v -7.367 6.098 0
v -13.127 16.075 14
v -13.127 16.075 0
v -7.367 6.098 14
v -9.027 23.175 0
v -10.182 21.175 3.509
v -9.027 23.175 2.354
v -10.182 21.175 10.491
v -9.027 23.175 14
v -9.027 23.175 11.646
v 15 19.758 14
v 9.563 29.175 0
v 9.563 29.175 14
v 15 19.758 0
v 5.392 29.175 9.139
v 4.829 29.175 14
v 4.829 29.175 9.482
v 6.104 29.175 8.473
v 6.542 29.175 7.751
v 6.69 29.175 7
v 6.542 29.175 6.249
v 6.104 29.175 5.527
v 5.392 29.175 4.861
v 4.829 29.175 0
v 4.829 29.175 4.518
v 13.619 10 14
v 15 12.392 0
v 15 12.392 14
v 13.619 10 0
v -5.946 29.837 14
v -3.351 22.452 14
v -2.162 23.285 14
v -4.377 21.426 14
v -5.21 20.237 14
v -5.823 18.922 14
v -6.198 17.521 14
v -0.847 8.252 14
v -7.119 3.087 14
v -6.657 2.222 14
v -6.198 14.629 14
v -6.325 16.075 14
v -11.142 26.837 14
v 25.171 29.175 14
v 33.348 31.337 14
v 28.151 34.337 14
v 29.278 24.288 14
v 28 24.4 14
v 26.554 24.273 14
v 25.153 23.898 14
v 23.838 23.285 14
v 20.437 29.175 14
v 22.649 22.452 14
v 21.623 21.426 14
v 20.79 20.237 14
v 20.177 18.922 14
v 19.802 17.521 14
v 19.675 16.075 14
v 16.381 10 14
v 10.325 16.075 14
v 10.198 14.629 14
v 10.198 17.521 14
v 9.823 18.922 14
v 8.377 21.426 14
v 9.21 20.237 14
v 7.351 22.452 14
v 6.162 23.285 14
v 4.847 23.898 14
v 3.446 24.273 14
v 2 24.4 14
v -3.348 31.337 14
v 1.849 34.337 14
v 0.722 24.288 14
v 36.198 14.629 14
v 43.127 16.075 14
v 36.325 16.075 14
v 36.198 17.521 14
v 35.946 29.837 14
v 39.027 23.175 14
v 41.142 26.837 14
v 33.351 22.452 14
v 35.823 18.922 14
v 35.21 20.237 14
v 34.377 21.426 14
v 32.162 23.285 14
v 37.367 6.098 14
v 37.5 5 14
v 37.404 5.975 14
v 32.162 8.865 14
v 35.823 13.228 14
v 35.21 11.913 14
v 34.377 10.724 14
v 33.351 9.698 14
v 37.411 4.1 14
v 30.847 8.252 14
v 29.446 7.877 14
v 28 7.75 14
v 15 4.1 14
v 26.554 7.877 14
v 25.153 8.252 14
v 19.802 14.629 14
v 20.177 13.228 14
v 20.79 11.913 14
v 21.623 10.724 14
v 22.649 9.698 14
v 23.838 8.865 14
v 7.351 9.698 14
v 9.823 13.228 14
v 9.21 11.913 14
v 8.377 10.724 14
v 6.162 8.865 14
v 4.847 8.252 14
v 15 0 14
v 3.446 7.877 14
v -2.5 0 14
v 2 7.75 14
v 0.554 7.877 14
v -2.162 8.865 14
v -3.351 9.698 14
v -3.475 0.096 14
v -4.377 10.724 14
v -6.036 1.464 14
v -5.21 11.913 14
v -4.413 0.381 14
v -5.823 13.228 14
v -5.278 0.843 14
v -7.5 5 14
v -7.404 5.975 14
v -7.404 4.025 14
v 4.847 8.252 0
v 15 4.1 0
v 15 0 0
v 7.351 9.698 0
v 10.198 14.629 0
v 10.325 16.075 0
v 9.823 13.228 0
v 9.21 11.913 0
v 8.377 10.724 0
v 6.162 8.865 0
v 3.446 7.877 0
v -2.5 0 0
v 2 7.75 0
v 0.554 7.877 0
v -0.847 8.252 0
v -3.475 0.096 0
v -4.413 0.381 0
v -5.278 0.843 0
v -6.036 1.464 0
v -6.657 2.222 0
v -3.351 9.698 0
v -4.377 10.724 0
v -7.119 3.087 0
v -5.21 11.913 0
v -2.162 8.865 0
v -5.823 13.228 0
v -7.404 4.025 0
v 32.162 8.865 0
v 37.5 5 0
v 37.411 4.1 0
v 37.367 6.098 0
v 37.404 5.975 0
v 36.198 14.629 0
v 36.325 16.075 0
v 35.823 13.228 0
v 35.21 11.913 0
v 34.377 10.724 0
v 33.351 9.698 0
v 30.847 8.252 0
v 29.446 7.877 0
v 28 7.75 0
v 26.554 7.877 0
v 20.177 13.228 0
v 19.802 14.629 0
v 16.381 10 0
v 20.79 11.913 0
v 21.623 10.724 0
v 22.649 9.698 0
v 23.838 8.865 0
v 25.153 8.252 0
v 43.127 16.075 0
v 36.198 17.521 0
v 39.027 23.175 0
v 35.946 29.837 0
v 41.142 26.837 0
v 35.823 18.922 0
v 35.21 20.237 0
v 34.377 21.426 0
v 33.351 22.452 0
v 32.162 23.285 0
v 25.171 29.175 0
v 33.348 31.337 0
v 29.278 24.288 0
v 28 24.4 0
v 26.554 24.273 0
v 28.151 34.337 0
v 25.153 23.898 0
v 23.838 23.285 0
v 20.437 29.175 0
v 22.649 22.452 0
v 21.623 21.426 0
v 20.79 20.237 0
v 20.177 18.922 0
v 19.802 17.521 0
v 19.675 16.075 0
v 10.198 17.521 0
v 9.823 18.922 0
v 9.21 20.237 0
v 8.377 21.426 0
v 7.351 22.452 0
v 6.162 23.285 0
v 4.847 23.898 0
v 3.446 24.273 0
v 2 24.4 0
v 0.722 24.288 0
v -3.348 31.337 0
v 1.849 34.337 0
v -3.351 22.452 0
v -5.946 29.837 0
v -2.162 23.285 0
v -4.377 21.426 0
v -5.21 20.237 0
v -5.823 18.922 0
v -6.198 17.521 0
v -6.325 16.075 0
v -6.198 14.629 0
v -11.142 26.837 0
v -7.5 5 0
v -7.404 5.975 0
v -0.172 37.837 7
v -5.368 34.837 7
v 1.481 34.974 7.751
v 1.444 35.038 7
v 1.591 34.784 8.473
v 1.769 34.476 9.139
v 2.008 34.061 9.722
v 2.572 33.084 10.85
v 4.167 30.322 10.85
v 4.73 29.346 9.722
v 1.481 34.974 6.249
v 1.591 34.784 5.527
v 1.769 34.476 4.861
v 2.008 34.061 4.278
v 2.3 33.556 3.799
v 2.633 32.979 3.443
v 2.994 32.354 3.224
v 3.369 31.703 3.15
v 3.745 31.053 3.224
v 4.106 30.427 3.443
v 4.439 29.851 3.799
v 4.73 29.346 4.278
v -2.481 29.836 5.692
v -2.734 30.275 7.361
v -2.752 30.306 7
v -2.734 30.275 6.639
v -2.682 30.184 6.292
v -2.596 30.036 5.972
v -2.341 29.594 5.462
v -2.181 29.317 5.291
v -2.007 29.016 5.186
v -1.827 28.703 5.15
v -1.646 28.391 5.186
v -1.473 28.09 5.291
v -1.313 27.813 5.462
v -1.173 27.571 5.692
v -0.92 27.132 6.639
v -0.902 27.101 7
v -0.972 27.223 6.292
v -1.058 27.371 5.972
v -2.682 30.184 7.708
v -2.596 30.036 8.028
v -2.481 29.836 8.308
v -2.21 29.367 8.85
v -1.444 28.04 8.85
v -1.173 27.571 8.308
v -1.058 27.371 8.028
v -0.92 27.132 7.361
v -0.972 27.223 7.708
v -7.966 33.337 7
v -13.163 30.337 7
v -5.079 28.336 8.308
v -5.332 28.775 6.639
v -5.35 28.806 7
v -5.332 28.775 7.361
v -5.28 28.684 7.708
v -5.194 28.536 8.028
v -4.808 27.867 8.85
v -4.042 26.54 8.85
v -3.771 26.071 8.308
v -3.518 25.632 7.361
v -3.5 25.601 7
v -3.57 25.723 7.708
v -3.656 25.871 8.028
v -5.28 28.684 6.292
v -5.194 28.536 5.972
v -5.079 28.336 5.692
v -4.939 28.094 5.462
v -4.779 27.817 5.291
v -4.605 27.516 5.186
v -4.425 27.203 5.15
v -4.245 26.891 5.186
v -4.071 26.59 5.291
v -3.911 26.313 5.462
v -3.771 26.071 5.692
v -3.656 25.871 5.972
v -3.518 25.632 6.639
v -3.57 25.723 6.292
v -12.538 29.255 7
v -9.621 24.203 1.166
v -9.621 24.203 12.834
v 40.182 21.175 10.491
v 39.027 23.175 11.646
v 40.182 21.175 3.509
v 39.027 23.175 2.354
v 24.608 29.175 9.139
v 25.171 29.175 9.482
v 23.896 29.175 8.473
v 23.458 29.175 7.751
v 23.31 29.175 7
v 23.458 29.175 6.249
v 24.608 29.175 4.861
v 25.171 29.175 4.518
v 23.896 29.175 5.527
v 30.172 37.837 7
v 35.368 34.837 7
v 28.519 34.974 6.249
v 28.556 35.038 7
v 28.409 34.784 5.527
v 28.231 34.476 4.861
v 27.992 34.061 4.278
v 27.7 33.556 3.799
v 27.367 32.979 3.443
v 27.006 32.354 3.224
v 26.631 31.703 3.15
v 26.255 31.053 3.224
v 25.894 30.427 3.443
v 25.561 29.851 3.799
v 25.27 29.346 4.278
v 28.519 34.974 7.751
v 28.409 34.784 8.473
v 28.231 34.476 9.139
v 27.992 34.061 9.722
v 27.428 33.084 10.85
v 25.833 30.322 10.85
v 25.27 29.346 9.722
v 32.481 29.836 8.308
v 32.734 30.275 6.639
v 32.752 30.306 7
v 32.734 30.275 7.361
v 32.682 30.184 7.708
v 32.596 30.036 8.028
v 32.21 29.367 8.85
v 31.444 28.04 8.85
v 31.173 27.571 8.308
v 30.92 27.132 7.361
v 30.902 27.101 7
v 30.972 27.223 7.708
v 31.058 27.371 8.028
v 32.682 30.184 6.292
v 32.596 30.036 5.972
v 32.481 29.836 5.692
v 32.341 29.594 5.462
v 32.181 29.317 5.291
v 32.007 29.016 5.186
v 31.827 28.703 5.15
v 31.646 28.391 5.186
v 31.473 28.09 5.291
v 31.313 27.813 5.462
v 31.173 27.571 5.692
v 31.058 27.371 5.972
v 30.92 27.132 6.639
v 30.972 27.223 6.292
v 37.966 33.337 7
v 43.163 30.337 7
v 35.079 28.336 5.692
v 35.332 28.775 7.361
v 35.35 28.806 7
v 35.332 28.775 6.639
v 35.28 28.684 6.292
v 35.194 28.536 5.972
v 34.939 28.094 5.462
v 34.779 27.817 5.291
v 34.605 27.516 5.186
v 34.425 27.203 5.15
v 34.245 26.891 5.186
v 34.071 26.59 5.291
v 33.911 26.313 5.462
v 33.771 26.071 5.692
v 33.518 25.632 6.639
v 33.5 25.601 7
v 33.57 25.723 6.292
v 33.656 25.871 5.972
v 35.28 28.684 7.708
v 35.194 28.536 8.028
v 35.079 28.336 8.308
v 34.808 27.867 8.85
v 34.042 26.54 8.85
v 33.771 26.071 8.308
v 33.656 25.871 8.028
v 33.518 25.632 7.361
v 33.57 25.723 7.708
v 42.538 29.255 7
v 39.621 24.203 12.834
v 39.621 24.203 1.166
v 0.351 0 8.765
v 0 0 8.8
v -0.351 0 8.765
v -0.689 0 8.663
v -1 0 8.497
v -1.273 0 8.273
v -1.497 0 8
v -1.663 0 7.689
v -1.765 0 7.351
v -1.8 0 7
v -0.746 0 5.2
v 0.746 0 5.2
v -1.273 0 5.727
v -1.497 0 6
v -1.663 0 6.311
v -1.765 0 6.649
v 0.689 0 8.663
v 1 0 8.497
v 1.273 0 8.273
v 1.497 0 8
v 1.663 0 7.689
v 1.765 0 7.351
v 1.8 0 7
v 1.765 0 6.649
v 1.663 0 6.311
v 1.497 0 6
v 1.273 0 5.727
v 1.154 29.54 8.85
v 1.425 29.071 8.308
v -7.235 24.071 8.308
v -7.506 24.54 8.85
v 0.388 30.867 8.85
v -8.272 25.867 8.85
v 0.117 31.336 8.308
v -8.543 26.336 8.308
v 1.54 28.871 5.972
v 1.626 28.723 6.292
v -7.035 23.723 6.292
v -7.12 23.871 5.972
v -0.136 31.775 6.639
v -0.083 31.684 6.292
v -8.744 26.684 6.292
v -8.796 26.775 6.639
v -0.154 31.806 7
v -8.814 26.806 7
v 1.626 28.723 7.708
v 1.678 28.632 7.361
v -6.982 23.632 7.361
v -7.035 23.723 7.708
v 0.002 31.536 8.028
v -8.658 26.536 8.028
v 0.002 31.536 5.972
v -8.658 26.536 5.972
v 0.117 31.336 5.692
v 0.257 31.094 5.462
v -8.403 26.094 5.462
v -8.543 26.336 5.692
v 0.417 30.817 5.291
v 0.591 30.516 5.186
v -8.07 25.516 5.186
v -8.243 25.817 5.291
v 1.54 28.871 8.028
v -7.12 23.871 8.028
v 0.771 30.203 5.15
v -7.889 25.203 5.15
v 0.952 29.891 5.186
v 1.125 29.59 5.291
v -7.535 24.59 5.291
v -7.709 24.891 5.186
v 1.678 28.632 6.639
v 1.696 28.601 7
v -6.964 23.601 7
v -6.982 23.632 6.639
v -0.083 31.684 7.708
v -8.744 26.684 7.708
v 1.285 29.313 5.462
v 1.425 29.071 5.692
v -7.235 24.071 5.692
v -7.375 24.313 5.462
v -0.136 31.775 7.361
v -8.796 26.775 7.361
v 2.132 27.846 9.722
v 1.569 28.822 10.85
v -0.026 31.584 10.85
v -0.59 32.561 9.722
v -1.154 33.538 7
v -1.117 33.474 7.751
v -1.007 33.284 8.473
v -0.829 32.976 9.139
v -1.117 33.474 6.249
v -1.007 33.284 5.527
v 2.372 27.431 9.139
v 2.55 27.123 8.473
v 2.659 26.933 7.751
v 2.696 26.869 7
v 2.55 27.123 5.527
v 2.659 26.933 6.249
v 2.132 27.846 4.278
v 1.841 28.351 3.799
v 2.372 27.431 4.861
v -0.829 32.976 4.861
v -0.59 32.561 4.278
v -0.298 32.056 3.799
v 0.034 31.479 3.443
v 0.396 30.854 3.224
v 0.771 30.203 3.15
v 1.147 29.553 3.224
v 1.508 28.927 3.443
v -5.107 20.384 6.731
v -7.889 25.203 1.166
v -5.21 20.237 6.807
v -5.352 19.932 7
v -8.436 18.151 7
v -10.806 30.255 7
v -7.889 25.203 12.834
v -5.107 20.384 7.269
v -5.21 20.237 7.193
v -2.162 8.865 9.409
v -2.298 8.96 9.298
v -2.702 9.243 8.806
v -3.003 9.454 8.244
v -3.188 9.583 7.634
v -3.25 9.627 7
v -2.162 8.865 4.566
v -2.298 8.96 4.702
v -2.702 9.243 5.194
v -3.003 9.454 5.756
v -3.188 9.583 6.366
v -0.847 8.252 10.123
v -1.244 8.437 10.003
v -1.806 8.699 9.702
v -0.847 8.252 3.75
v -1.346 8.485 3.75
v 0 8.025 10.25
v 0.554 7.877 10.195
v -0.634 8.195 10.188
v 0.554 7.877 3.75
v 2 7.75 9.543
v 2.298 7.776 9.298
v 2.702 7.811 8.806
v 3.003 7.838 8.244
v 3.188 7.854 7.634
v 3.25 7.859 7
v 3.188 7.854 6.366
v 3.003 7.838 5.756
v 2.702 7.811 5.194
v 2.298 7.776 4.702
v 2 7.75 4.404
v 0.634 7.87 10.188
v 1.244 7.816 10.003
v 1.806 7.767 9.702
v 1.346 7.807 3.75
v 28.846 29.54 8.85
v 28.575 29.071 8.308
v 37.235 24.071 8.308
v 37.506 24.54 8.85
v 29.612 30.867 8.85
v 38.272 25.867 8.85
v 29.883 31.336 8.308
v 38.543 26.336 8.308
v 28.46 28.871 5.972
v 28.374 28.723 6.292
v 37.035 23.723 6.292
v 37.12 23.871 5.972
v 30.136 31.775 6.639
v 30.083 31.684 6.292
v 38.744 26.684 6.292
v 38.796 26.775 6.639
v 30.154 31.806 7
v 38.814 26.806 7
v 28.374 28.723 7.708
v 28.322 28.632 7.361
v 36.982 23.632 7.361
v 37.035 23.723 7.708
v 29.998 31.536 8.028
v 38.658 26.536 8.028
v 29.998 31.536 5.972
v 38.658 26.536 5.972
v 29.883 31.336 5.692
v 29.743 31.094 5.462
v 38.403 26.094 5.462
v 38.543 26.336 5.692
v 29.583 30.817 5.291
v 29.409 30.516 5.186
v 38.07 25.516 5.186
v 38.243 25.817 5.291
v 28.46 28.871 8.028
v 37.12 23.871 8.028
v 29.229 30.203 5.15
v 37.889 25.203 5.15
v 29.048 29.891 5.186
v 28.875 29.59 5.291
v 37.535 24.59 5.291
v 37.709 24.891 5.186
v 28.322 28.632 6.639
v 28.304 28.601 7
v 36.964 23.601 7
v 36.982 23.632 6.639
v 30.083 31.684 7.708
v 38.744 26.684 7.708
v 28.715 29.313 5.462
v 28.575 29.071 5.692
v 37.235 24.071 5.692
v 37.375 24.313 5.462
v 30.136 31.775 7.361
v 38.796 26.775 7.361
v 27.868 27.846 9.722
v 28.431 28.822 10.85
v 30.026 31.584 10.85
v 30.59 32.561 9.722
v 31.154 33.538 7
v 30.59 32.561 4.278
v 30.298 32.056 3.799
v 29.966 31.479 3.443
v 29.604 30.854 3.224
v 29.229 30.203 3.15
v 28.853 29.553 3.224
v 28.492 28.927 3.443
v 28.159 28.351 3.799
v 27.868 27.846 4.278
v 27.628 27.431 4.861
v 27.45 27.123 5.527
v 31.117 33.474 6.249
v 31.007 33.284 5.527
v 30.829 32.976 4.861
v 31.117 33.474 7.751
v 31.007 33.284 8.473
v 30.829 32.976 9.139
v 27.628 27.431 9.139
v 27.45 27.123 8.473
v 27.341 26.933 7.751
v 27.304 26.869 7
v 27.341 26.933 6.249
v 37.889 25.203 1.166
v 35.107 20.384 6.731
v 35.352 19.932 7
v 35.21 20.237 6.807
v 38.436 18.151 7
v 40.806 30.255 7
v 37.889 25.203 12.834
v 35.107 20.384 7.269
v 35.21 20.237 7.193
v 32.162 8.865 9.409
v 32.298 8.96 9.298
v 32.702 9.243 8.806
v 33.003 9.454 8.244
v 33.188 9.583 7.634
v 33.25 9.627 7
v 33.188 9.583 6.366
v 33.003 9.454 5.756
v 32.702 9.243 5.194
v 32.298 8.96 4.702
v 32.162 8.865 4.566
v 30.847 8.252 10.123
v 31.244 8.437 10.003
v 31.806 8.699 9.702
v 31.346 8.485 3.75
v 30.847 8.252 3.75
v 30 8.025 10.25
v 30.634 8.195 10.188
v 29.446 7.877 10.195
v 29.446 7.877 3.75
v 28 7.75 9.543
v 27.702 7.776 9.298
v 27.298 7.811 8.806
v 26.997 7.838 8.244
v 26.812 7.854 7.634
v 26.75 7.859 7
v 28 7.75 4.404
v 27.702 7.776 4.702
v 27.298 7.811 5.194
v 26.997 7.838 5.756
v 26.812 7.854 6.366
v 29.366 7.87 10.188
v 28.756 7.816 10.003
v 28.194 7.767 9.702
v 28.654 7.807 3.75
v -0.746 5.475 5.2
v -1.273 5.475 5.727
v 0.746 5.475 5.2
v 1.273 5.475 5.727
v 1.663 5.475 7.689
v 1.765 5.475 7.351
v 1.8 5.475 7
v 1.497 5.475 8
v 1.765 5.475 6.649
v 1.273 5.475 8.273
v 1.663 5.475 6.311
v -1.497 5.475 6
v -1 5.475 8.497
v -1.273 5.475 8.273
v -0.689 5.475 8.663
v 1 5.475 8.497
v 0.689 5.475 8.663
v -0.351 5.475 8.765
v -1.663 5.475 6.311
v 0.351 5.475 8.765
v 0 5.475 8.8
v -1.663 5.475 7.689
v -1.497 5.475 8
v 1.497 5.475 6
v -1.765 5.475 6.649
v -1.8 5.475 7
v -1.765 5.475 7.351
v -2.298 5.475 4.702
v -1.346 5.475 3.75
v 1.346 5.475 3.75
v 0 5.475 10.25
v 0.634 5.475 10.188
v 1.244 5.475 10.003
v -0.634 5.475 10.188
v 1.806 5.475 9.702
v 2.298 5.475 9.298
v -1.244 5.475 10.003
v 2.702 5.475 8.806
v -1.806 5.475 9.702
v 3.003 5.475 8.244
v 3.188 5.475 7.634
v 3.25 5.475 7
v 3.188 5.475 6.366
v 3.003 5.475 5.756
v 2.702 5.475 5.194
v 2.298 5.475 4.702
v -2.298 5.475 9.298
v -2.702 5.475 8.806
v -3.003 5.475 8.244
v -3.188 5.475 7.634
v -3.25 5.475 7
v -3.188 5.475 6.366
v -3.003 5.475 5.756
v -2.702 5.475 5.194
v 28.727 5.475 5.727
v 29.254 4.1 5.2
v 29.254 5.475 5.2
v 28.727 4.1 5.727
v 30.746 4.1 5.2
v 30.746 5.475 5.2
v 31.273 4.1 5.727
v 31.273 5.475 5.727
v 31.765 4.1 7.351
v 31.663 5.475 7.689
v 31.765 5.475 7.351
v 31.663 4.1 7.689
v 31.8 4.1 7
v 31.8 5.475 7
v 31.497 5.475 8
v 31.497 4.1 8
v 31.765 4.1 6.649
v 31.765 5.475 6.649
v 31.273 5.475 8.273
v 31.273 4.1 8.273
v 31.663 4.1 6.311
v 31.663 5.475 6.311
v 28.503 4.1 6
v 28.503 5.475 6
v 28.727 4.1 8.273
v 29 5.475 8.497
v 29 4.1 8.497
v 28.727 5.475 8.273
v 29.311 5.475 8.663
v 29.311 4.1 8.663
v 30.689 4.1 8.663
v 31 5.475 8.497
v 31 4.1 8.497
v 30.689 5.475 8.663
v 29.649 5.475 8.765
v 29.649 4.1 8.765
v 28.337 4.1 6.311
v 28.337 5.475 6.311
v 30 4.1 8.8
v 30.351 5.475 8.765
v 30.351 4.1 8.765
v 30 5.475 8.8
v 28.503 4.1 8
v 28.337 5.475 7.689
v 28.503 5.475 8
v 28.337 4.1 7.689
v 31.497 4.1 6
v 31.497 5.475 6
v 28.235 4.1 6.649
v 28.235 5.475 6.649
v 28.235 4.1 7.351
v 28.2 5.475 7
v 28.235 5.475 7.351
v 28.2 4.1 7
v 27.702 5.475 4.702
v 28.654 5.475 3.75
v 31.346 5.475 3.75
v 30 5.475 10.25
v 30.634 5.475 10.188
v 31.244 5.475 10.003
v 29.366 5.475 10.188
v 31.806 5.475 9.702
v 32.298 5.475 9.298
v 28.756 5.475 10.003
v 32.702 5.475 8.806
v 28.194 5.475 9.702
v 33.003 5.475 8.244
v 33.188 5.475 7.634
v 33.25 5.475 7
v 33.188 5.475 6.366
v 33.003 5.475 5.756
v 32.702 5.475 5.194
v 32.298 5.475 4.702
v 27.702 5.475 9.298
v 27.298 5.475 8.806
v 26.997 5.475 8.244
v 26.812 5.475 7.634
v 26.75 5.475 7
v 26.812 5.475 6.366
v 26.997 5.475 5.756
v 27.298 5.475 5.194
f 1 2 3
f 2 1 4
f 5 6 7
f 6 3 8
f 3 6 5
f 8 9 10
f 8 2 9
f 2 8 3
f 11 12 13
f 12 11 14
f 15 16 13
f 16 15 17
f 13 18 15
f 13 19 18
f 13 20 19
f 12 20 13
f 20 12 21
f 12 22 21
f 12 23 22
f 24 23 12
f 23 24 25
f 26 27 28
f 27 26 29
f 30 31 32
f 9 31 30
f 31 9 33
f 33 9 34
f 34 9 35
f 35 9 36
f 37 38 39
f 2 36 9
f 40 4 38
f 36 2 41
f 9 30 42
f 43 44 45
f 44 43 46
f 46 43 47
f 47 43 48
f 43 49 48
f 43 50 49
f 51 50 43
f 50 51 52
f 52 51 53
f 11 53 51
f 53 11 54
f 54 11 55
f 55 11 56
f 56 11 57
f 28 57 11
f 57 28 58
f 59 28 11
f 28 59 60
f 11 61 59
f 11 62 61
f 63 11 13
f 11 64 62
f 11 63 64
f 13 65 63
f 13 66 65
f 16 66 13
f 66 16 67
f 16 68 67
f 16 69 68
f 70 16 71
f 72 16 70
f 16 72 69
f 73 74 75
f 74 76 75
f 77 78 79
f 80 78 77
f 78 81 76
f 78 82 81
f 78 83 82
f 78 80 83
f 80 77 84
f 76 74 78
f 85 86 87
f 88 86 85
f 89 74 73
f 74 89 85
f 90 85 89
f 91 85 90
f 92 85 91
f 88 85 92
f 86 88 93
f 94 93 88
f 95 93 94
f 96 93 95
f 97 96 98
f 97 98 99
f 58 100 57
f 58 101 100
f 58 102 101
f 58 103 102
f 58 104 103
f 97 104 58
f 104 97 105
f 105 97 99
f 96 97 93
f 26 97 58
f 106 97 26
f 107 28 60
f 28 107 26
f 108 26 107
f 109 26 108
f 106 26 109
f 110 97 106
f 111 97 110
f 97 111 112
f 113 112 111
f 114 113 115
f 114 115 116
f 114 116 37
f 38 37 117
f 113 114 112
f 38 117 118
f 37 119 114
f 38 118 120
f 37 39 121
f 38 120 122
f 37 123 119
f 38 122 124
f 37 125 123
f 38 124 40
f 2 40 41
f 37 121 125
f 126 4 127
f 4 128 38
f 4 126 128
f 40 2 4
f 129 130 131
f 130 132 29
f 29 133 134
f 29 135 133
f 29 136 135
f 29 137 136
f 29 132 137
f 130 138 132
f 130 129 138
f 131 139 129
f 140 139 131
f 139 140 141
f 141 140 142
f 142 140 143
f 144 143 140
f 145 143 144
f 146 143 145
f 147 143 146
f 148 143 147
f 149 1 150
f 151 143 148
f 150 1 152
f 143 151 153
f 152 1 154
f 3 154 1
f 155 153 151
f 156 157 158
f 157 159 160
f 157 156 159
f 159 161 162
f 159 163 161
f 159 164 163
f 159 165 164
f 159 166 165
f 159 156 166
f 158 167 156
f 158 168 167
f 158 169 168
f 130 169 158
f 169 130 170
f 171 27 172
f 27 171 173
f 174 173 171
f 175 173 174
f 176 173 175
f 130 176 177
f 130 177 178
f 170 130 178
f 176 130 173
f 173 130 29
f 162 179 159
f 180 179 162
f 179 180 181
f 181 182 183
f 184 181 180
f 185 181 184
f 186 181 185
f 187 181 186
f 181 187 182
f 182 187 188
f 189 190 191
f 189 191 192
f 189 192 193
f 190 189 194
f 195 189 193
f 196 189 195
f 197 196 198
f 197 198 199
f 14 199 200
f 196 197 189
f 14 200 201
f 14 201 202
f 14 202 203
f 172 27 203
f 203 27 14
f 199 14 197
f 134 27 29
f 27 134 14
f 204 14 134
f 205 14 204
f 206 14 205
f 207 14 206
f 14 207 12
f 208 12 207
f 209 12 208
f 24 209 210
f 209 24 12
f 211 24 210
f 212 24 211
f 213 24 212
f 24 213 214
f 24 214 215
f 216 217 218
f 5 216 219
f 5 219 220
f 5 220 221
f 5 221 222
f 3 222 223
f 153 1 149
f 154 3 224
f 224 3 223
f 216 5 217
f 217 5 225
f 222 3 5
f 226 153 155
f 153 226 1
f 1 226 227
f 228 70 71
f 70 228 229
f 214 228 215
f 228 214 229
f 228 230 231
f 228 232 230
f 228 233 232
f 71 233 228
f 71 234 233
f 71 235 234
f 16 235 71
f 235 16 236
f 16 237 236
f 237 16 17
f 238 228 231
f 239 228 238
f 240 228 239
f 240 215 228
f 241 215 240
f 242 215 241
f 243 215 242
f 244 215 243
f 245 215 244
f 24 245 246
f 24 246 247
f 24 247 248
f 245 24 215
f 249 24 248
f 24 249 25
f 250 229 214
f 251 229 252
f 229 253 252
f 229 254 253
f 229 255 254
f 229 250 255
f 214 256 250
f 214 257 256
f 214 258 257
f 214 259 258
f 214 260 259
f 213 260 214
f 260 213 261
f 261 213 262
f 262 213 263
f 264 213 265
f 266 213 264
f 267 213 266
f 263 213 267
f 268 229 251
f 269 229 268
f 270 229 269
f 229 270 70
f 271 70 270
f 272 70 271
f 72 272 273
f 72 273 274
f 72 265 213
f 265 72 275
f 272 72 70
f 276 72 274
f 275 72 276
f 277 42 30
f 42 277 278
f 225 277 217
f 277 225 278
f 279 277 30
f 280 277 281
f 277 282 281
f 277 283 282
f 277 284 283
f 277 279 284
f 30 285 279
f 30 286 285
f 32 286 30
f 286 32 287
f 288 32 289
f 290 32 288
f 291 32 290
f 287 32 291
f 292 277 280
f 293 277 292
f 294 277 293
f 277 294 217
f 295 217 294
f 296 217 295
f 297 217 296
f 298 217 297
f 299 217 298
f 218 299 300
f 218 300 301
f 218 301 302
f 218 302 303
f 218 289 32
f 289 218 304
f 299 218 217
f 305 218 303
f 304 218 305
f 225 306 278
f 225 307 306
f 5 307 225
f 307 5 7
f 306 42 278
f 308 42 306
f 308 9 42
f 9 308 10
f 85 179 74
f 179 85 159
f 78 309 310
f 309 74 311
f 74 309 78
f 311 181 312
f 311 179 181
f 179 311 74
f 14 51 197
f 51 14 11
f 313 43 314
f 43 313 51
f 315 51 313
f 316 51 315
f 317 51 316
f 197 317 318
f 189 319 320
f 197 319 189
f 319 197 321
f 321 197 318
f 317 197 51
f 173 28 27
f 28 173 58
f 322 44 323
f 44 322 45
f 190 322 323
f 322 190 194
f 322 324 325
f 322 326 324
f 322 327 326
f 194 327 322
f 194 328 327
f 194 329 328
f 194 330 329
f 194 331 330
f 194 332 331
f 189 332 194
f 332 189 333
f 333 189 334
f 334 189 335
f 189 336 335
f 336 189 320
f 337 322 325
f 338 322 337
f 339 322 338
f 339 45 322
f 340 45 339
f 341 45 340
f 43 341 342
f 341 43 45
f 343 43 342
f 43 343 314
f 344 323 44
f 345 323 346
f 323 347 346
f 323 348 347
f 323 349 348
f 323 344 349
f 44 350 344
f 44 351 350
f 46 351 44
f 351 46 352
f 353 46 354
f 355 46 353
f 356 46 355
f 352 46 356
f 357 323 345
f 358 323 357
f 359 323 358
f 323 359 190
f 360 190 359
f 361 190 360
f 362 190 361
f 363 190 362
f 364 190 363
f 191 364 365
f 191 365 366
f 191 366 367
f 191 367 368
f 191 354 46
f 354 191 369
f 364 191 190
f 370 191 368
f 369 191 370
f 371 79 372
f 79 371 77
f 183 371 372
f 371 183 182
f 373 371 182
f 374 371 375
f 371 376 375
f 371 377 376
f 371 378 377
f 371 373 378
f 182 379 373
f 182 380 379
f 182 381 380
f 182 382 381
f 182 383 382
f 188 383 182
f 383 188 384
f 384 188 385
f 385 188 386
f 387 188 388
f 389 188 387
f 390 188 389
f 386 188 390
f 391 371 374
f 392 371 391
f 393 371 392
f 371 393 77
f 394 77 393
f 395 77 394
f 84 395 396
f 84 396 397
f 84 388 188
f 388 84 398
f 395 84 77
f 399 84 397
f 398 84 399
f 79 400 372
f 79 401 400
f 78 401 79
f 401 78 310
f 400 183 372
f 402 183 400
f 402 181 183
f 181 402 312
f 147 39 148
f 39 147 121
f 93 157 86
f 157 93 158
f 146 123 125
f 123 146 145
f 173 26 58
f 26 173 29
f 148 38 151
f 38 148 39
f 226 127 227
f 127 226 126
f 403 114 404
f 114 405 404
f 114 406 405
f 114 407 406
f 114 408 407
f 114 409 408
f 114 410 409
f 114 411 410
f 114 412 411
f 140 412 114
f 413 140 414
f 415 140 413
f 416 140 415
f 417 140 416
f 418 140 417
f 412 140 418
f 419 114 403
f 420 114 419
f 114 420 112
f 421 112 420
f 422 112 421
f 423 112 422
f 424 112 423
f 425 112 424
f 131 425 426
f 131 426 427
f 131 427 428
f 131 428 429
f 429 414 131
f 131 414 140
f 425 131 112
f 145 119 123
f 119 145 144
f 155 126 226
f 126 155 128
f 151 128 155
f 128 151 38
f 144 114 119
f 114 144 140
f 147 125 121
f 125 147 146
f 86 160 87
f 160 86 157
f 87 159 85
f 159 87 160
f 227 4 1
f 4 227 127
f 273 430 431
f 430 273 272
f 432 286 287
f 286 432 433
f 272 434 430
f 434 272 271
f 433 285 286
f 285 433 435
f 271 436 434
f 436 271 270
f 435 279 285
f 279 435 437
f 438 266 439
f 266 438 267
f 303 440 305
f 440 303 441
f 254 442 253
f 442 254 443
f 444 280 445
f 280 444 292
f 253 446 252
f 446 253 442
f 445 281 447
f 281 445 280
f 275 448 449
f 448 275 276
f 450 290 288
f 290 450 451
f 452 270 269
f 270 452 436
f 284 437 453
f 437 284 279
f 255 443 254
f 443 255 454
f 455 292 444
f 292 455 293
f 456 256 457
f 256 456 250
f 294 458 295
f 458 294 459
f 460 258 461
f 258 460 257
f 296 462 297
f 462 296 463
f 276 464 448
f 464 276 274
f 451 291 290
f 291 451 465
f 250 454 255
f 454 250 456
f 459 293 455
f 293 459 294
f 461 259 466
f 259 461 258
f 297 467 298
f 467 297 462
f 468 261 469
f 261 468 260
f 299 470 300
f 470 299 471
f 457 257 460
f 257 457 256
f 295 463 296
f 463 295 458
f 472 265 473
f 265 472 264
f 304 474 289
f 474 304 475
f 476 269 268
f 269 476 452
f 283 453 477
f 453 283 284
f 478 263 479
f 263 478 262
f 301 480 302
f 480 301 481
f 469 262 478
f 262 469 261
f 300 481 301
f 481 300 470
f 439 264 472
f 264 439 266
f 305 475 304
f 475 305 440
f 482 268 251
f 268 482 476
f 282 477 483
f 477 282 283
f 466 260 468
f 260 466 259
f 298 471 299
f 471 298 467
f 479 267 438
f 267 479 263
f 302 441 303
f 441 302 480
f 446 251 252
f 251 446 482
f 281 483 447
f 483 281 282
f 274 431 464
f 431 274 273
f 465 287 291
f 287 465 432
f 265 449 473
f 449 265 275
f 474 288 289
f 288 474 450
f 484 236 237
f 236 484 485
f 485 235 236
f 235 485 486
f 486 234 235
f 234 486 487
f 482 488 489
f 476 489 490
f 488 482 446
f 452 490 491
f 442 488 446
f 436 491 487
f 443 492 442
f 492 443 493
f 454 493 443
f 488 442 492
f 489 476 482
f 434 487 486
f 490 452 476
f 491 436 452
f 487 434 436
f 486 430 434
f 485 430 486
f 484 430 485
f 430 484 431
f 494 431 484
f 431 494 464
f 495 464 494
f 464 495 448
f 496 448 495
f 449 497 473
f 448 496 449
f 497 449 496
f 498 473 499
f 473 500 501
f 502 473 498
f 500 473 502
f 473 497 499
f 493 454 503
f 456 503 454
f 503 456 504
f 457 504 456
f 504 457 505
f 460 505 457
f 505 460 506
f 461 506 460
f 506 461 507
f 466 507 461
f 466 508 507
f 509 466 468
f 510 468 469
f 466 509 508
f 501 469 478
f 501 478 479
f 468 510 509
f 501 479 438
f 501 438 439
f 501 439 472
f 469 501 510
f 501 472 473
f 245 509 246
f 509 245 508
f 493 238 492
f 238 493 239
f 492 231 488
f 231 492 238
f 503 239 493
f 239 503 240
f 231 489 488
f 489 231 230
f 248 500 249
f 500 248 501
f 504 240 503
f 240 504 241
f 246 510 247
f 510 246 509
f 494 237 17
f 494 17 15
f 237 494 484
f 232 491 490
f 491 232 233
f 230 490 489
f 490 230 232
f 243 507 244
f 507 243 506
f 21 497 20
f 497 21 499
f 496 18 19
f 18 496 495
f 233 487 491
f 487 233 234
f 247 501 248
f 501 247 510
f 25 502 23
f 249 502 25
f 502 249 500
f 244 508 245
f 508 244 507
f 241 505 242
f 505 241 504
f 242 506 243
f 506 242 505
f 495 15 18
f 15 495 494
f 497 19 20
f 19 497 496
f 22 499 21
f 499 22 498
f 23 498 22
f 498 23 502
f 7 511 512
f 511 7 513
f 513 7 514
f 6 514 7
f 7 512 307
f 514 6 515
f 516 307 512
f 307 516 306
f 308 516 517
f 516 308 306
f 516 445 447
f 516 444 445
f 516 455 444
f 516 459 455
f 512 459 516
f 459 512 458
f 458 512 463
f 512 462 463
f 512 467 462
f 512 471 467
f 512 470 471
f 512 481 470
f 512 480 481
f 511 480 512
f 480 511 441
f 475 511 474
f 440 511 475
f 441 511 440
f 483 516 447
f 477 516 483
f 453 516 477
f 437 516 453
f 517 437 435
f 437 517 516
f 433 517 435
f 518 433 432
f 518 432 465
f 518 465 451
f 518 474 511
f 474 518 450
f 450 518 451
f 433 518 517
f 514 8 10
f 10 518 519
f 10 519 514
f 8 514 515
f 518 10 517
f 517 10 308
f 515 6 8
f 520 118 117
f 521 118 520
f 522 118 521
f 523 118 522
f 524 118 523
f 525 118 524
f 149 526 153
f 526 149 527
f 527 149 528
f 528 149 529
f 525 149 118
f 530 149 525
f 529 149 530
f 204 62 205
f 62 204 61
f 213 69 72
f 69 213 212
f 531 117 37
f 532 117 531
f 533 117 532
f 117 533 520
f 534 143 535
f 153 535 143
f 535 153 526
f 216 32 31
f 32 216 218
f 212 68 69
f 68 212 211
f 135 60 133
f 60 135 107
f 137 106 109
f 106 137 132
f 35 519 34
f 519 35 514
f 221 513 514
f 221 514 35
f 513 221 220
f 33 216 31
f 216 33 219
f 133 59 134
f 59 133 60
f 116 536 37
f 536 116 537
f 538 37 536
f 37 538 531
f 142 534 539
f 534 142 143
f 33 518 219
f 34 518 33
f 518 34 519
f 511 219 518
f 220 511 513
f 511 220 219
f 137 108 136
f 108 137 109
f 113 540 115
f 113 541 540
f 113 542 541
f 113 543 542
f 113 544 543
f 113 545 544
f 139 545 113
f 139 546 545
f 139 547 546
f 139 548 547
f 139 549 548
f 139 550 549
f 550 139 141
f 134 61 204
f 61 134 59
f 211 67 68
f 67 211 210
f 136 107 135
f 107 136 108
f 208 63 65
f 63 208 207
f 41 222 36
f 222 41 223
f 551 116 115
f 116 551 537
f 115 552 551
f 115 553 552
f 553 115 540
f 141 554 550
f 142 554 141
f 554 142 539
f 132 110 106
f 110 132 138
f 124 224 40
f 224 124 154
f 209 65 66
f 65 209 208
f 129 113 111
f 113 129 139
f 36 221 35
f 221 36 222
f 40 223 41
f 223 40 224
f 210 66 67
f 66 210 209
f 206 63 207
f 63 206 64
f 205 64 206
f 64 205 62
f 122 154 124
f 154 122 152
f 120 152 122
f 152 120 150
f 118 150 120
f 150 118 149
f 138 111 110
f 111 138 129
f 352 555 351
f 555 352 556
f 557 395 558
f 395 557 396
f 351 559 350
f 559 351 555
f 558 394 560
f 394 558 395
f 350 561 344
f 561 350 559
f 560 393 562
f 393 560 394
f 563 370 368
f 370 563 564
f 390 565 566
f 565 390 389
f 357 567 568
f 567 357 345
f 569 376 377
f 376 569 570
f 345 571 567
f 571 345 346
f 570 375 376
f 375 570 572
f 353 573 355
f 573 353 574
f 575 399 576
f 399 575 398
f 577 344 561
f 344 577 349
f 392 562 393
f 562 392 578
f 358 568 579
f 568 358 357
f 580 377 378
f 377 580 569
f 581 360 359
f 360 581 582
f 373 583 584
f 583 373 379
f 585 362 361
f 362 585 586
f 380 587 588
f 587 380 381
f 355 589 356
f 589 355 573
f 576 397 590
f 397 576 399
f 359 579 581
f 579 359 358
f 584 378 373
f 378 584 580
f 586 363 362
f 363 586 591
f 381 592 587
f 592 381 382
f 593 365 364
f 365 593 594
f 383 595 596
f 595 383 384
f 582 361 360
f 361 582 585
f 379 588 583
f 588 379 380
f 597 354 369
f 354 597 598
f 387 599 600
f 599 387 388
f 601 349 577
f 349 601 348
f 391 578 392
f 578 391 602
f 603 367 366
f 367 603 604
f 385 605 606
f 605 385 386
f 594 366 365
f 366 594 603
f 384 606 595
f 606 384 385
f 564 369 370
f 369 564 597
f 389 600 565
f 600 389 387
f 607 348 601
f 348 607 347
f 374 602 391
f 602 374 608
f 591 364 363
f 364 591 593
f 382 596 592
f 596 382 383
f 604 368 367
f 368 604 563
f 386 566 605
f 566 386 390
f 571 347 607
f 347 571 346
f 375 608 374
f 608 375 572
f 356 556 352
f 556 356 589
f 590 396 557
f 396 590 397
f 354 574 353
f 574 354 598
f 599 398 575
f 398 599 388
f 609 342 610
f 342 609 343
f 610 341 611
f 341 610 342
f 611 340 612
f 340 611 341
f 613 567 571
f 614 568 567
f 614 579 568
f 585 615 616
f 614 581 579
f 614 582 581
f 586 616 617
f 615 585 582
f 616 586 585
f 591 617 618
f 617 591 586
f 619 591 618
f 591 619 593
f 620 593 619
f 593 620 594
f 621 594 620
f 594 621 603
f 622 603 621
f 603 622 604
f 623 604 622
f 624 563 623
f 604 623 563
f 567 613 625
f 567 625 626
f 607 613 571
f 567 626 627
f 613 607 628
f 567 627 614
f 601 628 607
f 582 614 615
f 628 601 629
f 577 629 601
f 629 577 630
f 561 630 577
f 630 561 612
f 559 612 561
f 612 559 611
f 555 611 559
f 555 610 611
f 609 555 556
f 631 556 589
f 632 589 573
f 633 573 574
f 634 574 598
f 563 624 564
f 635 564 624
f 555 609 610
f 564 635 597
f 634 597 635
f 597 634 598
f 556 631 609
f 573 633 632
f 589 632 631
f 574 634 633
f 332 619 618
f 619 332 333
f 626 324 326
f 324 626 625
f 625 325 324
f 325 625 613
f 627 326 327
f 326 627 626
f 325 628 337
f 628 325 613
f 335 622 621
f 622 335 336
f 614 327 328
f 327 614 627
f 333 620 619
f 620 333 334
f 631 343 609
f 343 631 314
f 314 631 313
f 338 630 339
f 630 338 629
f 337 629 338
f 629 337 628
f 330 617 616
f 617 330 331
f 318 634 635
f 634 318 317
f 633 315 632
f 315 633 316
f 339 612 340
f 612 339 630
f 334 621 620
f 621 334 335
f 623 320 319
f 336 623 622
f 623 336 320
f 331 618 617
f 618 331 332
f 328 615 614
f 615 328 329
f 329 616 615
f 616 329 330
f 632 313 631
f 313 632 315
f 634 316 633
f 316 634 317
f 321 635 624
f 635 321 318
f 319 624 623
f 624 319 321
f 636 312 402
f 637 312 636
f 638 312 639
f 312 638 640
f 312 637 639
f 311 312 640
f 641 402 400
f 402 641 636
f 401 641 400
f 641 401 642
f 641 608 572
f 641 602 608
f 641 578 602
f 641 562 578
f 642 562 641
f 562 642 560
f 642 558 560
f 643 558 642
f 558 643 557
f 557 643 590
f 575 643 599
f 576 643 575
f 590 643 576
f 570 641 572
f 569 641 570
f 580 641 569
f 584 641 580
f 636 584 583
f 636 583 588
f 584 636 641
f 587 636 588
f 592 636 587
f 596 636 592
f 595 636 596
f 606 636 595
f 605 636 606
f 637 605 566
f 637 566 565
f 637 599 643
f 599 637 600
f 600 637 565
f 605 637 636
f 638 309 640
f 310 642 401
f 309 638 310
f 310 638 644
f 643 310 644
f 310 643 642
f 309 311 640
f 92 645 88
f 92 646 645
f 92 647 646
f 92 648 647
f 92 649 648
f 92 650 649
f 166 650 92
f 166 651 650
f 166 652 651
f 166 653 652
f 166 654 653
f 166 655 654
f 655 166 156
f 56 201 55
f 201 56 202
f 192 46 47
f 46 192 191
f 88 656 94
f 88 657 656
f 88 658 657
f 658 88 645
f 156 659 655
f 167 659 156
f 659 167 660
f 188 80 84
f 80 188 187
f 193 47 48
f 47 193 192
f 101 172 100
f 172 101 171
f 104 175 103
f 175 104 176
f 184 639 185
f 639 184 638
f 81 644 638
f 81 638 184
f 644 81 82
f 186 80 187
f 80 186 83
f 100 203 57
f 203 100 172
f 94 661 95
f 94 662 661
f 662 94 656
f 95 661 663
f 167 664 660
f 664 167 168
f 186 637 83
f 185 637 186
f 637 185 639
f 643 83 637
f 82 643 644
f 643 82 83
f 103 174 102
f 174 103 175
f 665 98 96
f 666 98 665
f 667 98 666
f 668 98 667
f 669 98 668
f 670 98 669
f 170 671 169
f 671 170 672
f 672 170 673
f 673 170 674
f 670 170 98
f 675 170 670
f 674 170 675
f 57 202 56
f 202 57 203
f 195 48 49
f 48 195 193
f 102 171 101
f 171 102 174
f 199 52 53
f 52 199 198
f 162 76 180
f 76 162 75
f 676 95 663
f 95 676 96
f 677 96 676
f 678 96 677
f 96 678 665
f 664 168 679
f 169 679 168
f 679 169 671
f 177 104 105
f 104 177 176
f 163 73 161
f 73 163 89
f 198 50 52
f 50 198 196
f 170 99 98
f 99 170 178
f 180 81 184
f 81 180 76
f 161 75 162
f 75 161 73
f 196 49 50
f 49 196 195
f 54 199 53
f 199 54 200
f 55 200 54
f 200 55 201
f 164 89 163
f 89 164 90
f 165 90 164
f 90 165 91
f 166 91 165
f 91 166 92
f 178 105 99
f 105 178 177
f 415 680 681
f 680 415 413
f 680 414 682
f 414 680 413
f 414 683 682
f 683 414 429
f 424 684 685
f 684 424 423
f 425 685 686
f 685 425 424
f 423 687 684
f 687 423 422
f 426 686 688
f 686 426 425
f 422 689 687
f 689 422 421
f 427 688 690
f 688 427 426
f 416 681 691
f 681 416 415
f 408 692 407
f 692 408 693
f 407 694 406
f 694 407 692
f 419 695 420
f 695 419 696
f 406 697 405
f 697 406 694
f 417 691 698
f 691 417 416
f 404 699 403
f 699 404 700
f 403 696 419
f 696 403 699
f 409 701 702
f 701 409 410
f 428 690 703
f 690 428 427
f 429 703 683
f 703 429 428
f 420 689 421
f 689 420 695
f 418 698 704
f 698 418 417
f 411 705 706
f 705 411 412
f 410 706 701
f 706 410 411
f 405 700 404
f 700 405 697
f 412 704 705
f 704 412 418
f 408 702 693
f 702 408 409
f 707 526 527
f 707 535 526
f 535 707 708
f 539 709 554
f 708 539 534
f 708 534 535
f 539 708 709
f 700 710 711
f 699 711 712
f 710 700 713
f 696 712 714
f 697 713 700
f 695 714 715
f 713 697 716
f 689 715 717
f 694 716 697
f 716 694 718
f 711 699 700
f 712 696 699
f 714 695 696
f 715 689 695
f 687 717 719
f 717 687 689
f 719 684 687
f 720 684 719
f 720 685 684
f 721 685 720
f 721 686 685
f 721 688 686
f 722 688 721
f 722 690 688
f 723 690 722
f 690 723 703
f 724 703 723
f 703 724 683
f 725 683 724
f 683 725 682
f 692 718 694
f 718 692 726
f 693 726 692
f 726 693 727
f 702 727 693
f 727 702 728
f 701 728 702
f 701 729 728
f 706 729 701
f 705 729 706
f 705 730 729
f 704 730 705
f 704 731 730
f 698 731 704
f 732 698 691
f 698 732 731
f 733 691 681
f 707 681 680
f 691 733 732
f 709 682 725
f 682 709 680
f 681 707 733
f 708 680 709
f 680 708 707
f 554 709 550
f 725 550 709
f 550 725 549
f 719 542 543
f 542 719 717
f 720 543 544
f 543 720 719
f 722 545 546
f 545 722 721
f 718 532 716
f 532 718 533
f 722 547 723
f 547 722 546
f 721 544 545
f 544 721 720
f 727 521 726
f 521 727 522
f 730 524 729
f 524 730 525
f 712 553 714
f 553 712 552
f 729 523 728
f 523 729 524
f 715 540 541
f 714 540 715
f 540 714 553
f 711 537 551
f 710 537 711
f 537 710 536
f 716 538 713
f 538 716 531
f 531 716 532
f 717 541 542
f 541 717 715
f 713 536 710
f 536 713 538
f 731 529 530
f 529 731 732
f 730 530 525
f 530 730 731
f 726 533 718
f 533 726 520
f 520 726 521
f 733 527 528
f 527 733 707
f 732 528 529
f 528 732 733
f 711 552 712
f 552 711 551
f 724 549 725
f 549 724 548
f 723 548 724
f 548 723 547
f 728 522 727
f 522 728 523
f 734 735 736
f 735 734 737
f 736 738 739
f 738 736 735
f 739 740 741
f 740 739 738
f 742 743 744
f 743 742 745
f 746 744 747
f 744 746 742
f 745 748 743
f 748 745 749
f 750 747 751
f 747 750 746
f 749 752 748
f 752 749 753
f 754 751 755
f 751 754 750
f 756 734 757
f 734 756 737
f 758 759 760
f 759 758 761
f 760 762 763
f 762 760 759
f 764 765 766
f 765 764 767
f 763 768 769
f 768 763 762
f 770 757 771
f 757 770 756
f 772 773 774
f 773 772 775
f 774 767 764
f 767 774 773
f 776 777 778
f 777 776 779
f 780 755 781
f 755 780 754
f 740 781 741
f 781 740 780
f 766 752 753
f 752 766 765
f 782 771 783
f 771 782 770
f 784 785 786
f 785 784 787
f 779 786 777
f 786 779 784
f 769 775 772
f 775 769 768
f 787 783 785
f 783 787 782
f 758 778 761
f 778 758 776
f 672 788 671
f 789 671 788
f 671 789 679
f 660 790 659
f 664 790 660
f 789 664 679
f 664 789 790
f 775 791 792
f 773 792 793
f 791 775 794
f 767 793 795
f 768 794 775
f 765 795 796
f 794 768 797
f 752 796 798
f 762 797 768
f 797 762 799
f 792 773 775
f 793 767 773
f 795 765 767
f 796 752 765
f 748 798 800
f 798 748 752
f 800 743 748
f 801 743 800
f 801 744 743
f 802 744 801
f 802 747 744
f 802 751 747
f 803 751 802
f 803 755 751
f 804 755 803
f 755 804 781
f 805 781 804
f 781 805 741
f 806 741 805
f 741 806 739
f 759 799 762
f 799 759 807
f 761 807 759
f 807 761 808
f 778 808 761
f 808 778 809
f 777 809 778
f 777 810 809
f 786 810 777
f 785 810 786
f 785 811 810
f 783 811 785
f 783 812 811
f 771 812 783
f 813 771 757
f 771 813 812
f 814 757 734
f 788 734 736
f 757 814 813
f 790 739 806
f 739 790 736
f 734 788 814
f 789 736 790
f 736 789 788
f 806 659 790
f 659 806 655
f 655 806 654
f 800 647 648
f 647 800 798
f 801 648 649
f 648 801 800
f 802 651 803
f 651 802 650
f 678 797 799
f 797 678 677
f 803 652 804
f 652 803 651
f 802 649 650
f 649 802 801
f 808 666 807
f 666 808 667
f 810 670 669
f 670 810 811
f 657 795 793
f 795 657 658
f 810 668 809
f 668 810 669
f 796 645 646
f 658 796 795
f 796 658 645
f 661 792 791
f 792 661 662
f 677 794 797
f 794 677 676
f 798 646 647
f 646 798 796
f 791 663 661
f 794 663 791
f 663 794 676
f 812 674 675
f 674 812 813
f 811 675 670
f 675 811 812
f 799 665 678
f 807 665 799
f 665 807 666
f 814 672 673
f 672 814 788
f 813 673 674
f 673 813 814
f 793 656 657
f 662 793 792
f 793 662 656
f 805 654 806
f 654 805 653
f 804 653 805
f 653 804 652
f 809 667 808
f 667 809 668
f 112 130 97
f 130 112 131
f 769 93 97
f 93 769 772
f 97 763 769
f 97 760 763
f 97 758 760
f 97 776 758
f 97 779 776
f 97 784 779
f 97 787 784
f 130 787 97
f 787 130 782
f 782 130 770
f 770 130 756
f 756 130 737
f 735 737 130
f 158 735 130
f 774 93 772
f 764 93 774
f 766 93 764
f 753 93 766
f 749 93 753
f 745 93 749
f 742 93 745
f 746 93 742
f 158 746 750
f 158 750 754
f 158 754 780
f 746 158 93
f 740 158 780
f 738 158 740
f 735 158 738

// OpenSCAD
hole_sep = 30;
hole_sep_2 = 20;
slop = .1;
lower_hole_sep = 30;
lower_hole_rad = 5.5+slop;
lower_hole_height = -7.5;



%cube([9,9,100],center=true);

wall=4;
m_thickness = wall*2+1+1;
hotend_attachment_rad = 23;  

//hotend stuff
hotend_rad = 8+slop;

//standard stuff
bolt_slop = .5;
nut_slop = .85;
bolt_dia = 5+bolt_slop;
bolt_rad = bolt_dia/2;
bolt_cap_dia = 10+bolt_slop;
bolt_cap_rad = bolt_cap_dia/2;
nut_dia = 9+nut_slop;
nut_rad = nut_dia/2;
nut_height = 3.25;
lock_nut_height = 5.25;

m3_nut_rad = 6/cos(30)/2;
m3_nut_height = 3;
m3_rad = 1.8;
m3_cap_rad = 3.25;
m3_cap_height = 2;

632_dia = 3.5;
632_rad = 632_dia/2+slop;
632_nut_rad = 8.25/cos(45)/2;
632_cap_dia = 6.5;
632_cap_rad = 632_cap_dia/2+slop;
632_cap_height = 2+slop;
632_nut_height = 5;

//the radius of the induction sensor
ind_rad = 18/2+slop*2;
ind_offset = -30;
ind_height = 12;

fan_offset = -15;

//not sure why these are needed
arm_rad = wall*1.75;
nut_mount = wall+nut_height/2;	//thickness behind cone
arm_sep = 54;

e3d_fin_rad = 26/2;  //////////23 for the e3d V6; the V5 is 26 
echo("Nozzle Sep = ", e3d_fin_rad*2);
//extruder_sep = e3d_fin_rad*2;


//bowden_mount();
//translate([0,25,0]) nut_trap();
//translate([0,50,0]) fan_duct(clip_height=25); 
//translate([0,50,0]) fan_duct_induction(clip_height=35, e3d_fin_rad = 26/2); //v5
//translate([0,50,0]) fan_duct_induction(clip_height=25, e3d_fin_rad = 23/2); //v6

//translate([0,-50, 0])
//!cyclops_mount();

inline_mount(left_inset=4.1);

$fn=32;

module nut_trap(){
	difference(){
		union(){
			translate([0,0,wall/6]) cube([hole_sep,wall*2,wall/3], center=true);
			for(i=[0:1]) mirror([i,0,0]) translate([hole_sep/2,0,0]) cylinder(r=632_nut_rad+wall/2,h=632_nut_height, $fn=4);
		}
		for(i=[0:1]) mirror([i,0,0]) translate([hole_sep/2,0,0]){
			translate([0,0,1]) cylinder(r=632_nut_rad,h=632_nut_height, $fn=4);
			translate([0,0,-1]) cylinder(r=632_rad,h=632_nut_height);
		}
	}
}

module fan_duct_induction(clip_height = 40, wire_offset = 4){
        extruder_sep = e3d_fin_rad*2;
    
    	height = 40;
	fan_w = 40;
	fan_screwhole = 32/2;
	fan_rad = 36/2;

	ductwall = 3.5;

	cutoff = 45;
    
        unclip_height = 40-clip_height;
    
        translate([0,0,height/2]) rotate([90,0,0])
	difference(){
                union(){
                    hull(){
			//fan
			translate([0,0,wall/2]) rotate([0,45,0]) translate([0,0,fan_offset]) cube([fan_w, fan_w, wall], center=true);
                        //translate([0,height/2-unclip_height/2,extruder_sep+wall/2+wire_offset]) cube([extruder_sep+e3d_fin_rad*2+ductwall,unclip_height,wall], center=true);

                        //the e3d body, with a gap for the wires to pop up
			for(i=[-1,1]) for(j=[0,wire_offset]) translate([i*extruder_sep/2,0,extruder_sep/2+wall+j]) rotate([90,0,0]) cylinder(r=e3d_fin_rad+ductwall/2, h=height, center=true);
                            
                        
                    }
                    //the induction sensor mount
                    translate([extruder_sep/2,-height/2,extruder_sep/2+wall+wire_offset+ind_offset]) rotate([-90,0,0]) extruder_mount(1, m_height=ind_height, hotend_rad=ind_rad);
                    
		}
                //induction mount
                translate([extruder_sep/2,-height/2,extruder_sep/2+wall+wire_offset+ind_offset]) rotate([-90,0,0]) extruder_mount(0, m_height=ind_height,  hotend_rad=ind_rad);
                
                //the e3d holes
                #for(i=[-1,1]) translate([i*extruder_sep/2,0,extruder_sep/2+wall+wire_offset]) rotate([90,0,0]) cylinder(r=e3d_fin_rad, h=height+2, center=true);
                
                hull()
                    for(i=[-1,1]) translate([i*extruder_sep/2-wire_offset/2*i+5*i,0,wall+wire_offset/2]) {
                        rotate([90,0,0]) cylinder(r=wire_offset/2, h=height+ductwall*2, center=true);
                        translate([0,0,5]) rotate([90,0,0]) cylinder(r=wire_offset/2, h=height+ductwall*2, center=true);
                    }
                    
                //cutout around the hotend clamps
                hull(){
                    translate([0,height/2-unclip_height+wall/2,wall+wall]) rotate([0,90,0]) cylinder(r=wall/2, h=100, center=true);
                    translate([0,height/2-unclip_height+wall/2,wall+wall+height]) rotate([0,90,0]) cylinder(r=wall/2, h=100, center=true);
                    translate([0,height,wall+wall]) rotate([0,90,0]) cylinder(r=wall/2, h=100, center=true);
                }

		//cutout for clipping on
                for(i=[0,1]) mirror([i,0,0]) translate([extruder_sep/2,-height/2-.1,extruder_sep/2+wall+wire_offset]){
                     rotate([0,-90+cutoff,0]) difference(){
                        cube([extruder_sep,height+1, extruder_sep]);
                        rotate([-90,0,0]) translate([e3d_fin_rad+ductwall/4,0,-.1]) cylinder(r=ductwall/4, h=height+3, $fn=16);
                    }
                }
                
		//translate([0,0,50+cutoff]) cube([100,100,100], center=true);
		//cutoff the center
		translate([0,0,50+wall]) cube([extruder_sep,100,100], center=true);

		//fan
                difference(){
                    hull(){
                        translate([0,0,wall/2]) rotate([0,45,0]) translate([0,0,fan_offset-wall/2-.1]) cylinder(r=fan_rad,h=wall);
                        translate([0,0,wall]) cylinder(r=fan_rad,h=.1);
                    }
                     translate([extruder_sep/2,-height/2,extruder_sep/2+wall+wire_offset+ind_offset]) rotate([-90,0,0]) extruder_mount(0, m_height=ind_height,  hotend_rad=ind_rad+1);
                }
                translate([0,0,wall]) cylinder(r=fan_rad,h=wall);
                
                //fan mount
                translate([0,0,wall/2]) rotate([0,45,0]) translate([0,0,fan_offset]) {
                    for(i=[0:90:359]) rotate([0,0,i]) translate([fan_screwhole, fan_screwhole, -.1]){
                            cylinder(r=m3_rad, h=wall*4, center=true);
                            translate([0,0,wall/2-.1]) cylinder(r1=m3_nut_rad, r2=m3_nut_rad+.5, h=wall*3, $fn=6);
                    }
                }
	}
}

module fan_duct(clip_height = 40, wire_offset = 4){
	height = 40;
	fan_w = 40;
	fan_screwhole = 32/2;
	fan_rad = 36/2;

	ductwall = 3.5;

	cutoff = 40;
    
        unclip_height = 40-clip_height;

        echo(unclip_height);
    
	translate([0,0,height/2]) rotate([90,0,0])
	difference(){
                union(){
                    hull(){
			//fan
			translate([0,0,wall/2]) cube([fan_w, fan_w, wall], center=true);
                        //translate([0,height/2-unclip_height/2,extruder_sep+wall/2+wire_offset]) cube([extruder_sep+e3d_fin_rad*2+ductwall,unclip_height,wall], center=true);

			for(i=[-1,1]) for(j=[0,wire_offset]) translate([i*extruder_sep/2,0,extruder_sep/2+wall+j]) rotate([90,0,0]) cylinder(r=e3d_fin_rad+ductwall/2, h=height, center=true);
                            
                    }
                    *hull(){
                         #translate([0,height/2-unclip_height/2,extruder_sep+wall/2+wire_offset]) cube([extruder_sep+e3d_fin_rad*2+ductwall,unclip_height,wall], center=true);
                         #for(i=[-1,1]) translate([i*extruder_sep/2,height/2,extruder_sep/2+wall+wire_offset]) rotate([90,0,0]) cylinder(r=e3d_fin_rad+ductwall/2, h=unclip_height+wall);
                    }
		}
                
                for(i=[-1,1]) translate([i*extruder_sep/2,0,extruder_sep/2+wall+wire_offset]) rotate([90,0,0]) cylinder(r=e3d_fin_rad, h=height+2, center=true);
                
                for(i=[-1,1]) translate([i*extruder_sep/2-wire_offset/2*i,0,extruder_sep/2+wall-wire_offset/2]) rotate([90,0,0]) cylinder(r=e3d_fin_rad-wire_offset/2, h=height+ductwall*2, center=true);
                    
                //cutout around the hotend clamps
                //translate([0,height/2-unclip_height/2,wall+height/2+wall/2]) cube([extruder_sep+e3d_fin_rad*3,unclip_height+.1,height], center=true);
                hull(){
                    translate([0,height/2-unclip_height+wall/2,wall+wall]) rotate([0,90,0]) cylinder(r=wall/2, h=100, center=true);
                    translate([0,height/2-unclip_height+wall/2,wall+wall+height]) rotate([0,90,0]) cylinder(r=wall/2, h=100, center=true);
                    translate([0,height,wall+wall]) rotate([0,90,0]) cylinder(r=wall/2, h=100, center=true);
                }

		//cutout for clipping on
                for(i=[0,1]) mirror([i,0,0]) translate([extruder_sep/2,-height/2-.1,extruder_sep/2+wall+wire_offset]){
                     rotate([0,-90+cutoff,0]) difference(){
                        cube([extruder_sep,height+1, extruder_sep]);
                        rotate([-90,0,0]) translate([e3d_fin_rad+ductwall/4,0,-.1]) cylinder(r=ductwall/4, h=height+3, $fn=16);
                    }
                }
                
                
                    
                
		//translate([0,0,50+cutoff]) cube([100,100,100], center=true);
		//cutoff the center
		translate([0,0,50+wall]) cube([extruder_sep,100,100], center=true);

		//fan
		cylinder(r=fan_rad,h=height*2, center=true);
		for(i=[0:90:359]) rotate([0,0,i]) translate([fan_screwhole, fan_screwhole, -.1]){
			cylinder(r=m3_rad, h=wall*4);
			translate([0,0,wall/2-.1]) cylinder(r1=m3_nut_rad, r2=m3_nut_rad+.5, h=wall*4, $fn=6);
		}
	}
}

//mounting holes for the cyclops
module cyclops_holes(solid=0, jut=0){
    hole_sep = 9;
    hole_zsep = 10;
    ind_jut = 2;
    
    for(i=[0,1]) mirror([i,0,0]){
        translate([hole_sep/2,-wall,hole_zsep]) rotate([-90,0,0]){
            if(solid>=0){
                cylinder(r=m3_rad+wall, h=wall);
                if(jut==1){
                    translate([0,0,wall-.1]) cylinder(r1=m3_rad+wall, r2=m3_rad+wall/2, h=ind_jut+.1);
                }
            }
            if(solid<=0) translate([0,0,-.1]) {
                cap_cylinder(r=m3_rad, h=wall*2);
                cap_cylinder(r=m3_cap_rad, h=m3_cap_height);
            }
        }
    }
    
    translate([0,-wall,0]) rotate([-90,0,0]){
        if(solid>=0){
            cylinder(r=m3_rad+wall, h=wall);
            if(jut==1){
                translate([0,0,wall-.1]) cylinder(r1=m3_rad+wall, r2=m3_rad+wall/2, h=ind_jut+.1);
            }
        }
        if(solid<=0) translate([0,0,-.1]) {
            %translate([0,-5,9+wall+ind_jut+.1]) cube([30,30,18], center=true);
            %translate([0,-5,6+wall+ind_jut+.1]) rotate([90,0,0]) cylinder(r=1, h=50, center=true);
            cap_cylinder(r=m3_rad, h=wall*2);
            cap_cylinder(r=m3_cap_rad, h=m3_cap_height);
        }
    }
}

module i3_holes(solid=0){
    attach_height=0;
    for(i=[0,1]) mirror([i,0,0]){
        translate([lower_hole_sep/2,-wall,attach_height]) rotate([-90,0,0]){
            if(solid>=0)
                cylinder(r=632_rad+wall, h=wall);
            if(solid<=0) translate([0,0,-.1]) {
                cap_cylinder(r=632_rad, h=wall*2);
                //translate([0,0,wall-632_cap_height]) 
                translate([0,0,1.5]) 
                cap_cylinder(r=632_cap_rad, h=632_cap_height+wall);
            }
        }
    }
}

module cyclops_mount(induction=1){
    mount_height = 20;
    e3d_mount_height = wall;
    e3d_mount_offset = 15;
    ind_offset=(16-18)/2;
    wall=4;
    
    difference(){
        union(){
            hull(){
                for(i=[0,1]) mirror([i,0,0])
                    translate([e3d_mount_offset,0,e3d_mount_height]) cyclops_holes(1, wall=wall);
                translate([0,0,mount_height]) i3_holes(1, wall=wall);
            }
            if(induction==1){
                translate([-e3d_mount_offset,ind_rad+ind_offset,0]) rotate([0,0,90]) extruder_mount(1, m_height=ind_height, hotend_rad=ind_rad, wall=wall);
            }
            
            translate([e3d_mount_offset,0,e3d_mount_height]) cyclops_holes(1, jut=1, wall=wall);
        }
        
        translate([e3d_mount_offset,0,e3d_mount_height]) cyclops_holes(-1, wall=wall);
        translate([0,0,mount_height]) i3_holes(-1, wall=wall);
        if(induction==1){
            translate([-e3d_mount_offset,ind_rad+ind_offset,0]) rotate([0,0,90]) extruder_mount(0, m_height=ind_height, hotend_rad=ind_rad, wall=wall);
        }
        
        //cut off back and base
        translate([0,-50-wall,0]) cube([100,100,100], center=true);
        translate([0,0,-50]) cube([100,100,100], center=true);
    }
    
}

$fn=32;
module inline_mount(height=14, left_inset=0, wall=5){
    extruder_sep = e3d_fin_rad*2;
    attach_height = height+3;

	echo(e3d_fin_rad);
	echo(hotend_rad);
   
	 x_offset=(30-extruder_sep)/2;
	 y_offset=left_inset*3/4;
     
    difference(){
		  union(){
			  translate([-wall/2,wall,0]) hull(){
			  	cylinder(r=wall, h=height);
				translate([30+wall,0,0]) cylinder(r=wall, h=height);
			  }

		  	  translate([x_offset,y_offset,0]){
				translate([0,e3d_fin_rad,0]) mirror([1,0,0]) rotate([0,0,60]) extruder_mount(1,height,0,0, wall=wall);
				translate([extruder_sep,e3d_fin_rad,0]) rotate([0,0,60]) extruder_mount(1,height,0,0, wall=wall);
			  }
        }
		  
        translate([x_offset,y_offset,0]) {
			translate([0,e3d_fin_rad,0]) mirror([1,0,0]) rotate([0,0,60]) extruder_mount(0,height,0,0);
        	translate([extruder_sep,e3d_fin_rad,0]) rotate([0,0,60]) extruder_mount(0,height,0,0);
		  }
        
        //mounting holeds
        for(i=[0,30]) translate([i,e3d_fin_rad,height/2]) rotate([90,0,0]) {
            cap_cylinder(r=m3_rad, h=50);
				translate([0,0,-y_offset]) cap_cylinder(r=m3_cap_rad, h=hotend_rad+wall/2);
        }
	
		  //flatten the back
		  translate([0,-50,0]) cube([100,100,100], center=true);
    		
		  //cut into the left side - to avoid the induction sensor mount
		  translate([extruder_sep/2+50+x_offset,-50+left_inset,0]) cube([100,100,100], center=true);
	}
}

module bowden_mount(height=14, induction = 1){
        extruder_sep = e3d_fin_rad*2;
        attach_height = height+3;
	difference(){
		union(){
			for(i=[0,1]) mirror([i,0,0]) translate([extruder_sep/2,e3d_fin_rad-hotend_rad,0]) extruder_mount(1,height,0,0);

			//mount supports
			hull(){
				for(i=[0,1]) mirror([i,0,0]) translate([hole_sep/2,-hotend_rad-wall,attach_height]) rotate([-90,0,0]) cylinder(r=632_rad+wall, h=wall);
				for(i=[0,1]) mirror([i,0,0]) translate([hole_sep/3,-hotend_rad-wall,632_rad+wall]) rotate([-90,0,0]) rotate([0,0,-180/5/2]) cylinder(r=(632_rad+wall)/cos(180/5), h=wall, $fn=5);
			}

			//fillet
			difference(){
				translate([0,-hotend_rad,height+wall/2-.01]) cube([extruder_sep+(hotend_rad/cos(180/18)+.1+wall)/cos(30),wall*2,wall], center=true);
				translate([0, wall/2, wall/2]) translate([0,-hotend_rad+wall/2-.05,height+wall/2-.05]) rotate([0,90,0]) cylinder(r=wall, h=hole_sep+632_rad*2+wall*2+1, center=true);
			}
                        
                        if(induction==1){
                            translate([0,e3d_fin_rad*2-hotend_rad+ind_rad,0]) rotate([0,0,90]) extruder_mount(1, m_height=ind_height, hotend_rad=ind_rad);
                        }
		}
                if(induction==1){
                    translate([0,e3d_fin_rad*2-hotend_rad+ind_rad,0]) rotate([0,0,90]) extruder_mount(0, m_height=ind_height, hotend_rad=ind_rad);
                }
                        
		for(i=[0,1]) mirror([i,0,0]) translate([extruder_sep/2,e3d_fin_rad-hotend_rad,0]) extruder_mount(0,height,0,0);

		//holes
		for(i=[0,1]) mirror([i,0,0]) translate([hole_sep/2,-hotend_rad-wall-.1,attach_height]) rotate([-90,0,0]) {
			cap_cylinder(r=632_rad, h=wall+1);
			//translate([0,0,wall-632_cap_height]) cap_cylinder(r=632_cap_rad, h=wall+1);
	
			//hollows for other screws on mount
			translate([lower_hole_sep/2-hole_sep/2, -lower_hole_height, 0]) cap_cylinder(r=lower_hole_rad, h=wall+1);
		}

	}
}


module extruder_mount(solid = 1, m_height = 10, fillet = 8, tap_height=0, width=20, fn=6){
	gap = 3;
	tap_dia = 9.1;
	tap_rad = tap_dia/2;

	if(solid){		
		//clamp material
		if(m_height > nut_rad*2){
			cylinder(r=(hotend_rad+wall)/cos(30), h=m_height, $fn=fn);
			translate([hotend_rad+bolt_rad+1,gap,m_height/2]) rotate([-90,0,0]) cylinder(r=m_height/2/cos(30), h=wall+1, $fn=6);
			translate([hotend_rad+bolt_rad+1,-wall-1,m_height/2]) rotate([-90,0,0]) cylinder(r=m_height/2/cos(30), h=wall+1, $fn=6);
		}
	}else{
		union(){
			//hotend hole
			translate([0,0,-.05]) cylinder(r=hotend_rad/cos(180/18)+.1, h=m_height+40, $fn=36);

			//bolt slots
			if(m_height > nut_rad*2){
				render() translate([hotend_rad+bolt_rad+2,-m_thickness-.05,m_height/2]) rotate([-90,0,0]) cap_cylinder(r=632_rad, h=m_thickness+10);
				translate([hotend_rad+bolt_rad+2,-wall*2,m_height/2]) rotate([-90,0,0]) cylinder(r=632_nut_rad, h=wall, $fn=4);

				//mount tightener
				translate([hotend_rad+bolt_rad+2,wall+gap-1,m_height/2]) rotate([-90,0,0]) cap_cylinder(r=632_cap_rad+.5, h=10);
				translate([0,0,-.05]) cube([wall*5, gap, m_height+.1]);
			}
		}
	}
}

module cap_cylinder(r=1, h=1, center=false){
	render() union(){
		cylinder(r=r, h=h, center=center);
		intersection(){
			rotate([0,0,22.5]) cylinder(r=r/cos(180/8), h=h, $fn=8, center=center);
			translate([0,-r/cos(180/4),0]) rotate([0,0,0]) cylinder(r=r/cos(180/4), h=h, $fn=4, center=center);
		}
	}
}
